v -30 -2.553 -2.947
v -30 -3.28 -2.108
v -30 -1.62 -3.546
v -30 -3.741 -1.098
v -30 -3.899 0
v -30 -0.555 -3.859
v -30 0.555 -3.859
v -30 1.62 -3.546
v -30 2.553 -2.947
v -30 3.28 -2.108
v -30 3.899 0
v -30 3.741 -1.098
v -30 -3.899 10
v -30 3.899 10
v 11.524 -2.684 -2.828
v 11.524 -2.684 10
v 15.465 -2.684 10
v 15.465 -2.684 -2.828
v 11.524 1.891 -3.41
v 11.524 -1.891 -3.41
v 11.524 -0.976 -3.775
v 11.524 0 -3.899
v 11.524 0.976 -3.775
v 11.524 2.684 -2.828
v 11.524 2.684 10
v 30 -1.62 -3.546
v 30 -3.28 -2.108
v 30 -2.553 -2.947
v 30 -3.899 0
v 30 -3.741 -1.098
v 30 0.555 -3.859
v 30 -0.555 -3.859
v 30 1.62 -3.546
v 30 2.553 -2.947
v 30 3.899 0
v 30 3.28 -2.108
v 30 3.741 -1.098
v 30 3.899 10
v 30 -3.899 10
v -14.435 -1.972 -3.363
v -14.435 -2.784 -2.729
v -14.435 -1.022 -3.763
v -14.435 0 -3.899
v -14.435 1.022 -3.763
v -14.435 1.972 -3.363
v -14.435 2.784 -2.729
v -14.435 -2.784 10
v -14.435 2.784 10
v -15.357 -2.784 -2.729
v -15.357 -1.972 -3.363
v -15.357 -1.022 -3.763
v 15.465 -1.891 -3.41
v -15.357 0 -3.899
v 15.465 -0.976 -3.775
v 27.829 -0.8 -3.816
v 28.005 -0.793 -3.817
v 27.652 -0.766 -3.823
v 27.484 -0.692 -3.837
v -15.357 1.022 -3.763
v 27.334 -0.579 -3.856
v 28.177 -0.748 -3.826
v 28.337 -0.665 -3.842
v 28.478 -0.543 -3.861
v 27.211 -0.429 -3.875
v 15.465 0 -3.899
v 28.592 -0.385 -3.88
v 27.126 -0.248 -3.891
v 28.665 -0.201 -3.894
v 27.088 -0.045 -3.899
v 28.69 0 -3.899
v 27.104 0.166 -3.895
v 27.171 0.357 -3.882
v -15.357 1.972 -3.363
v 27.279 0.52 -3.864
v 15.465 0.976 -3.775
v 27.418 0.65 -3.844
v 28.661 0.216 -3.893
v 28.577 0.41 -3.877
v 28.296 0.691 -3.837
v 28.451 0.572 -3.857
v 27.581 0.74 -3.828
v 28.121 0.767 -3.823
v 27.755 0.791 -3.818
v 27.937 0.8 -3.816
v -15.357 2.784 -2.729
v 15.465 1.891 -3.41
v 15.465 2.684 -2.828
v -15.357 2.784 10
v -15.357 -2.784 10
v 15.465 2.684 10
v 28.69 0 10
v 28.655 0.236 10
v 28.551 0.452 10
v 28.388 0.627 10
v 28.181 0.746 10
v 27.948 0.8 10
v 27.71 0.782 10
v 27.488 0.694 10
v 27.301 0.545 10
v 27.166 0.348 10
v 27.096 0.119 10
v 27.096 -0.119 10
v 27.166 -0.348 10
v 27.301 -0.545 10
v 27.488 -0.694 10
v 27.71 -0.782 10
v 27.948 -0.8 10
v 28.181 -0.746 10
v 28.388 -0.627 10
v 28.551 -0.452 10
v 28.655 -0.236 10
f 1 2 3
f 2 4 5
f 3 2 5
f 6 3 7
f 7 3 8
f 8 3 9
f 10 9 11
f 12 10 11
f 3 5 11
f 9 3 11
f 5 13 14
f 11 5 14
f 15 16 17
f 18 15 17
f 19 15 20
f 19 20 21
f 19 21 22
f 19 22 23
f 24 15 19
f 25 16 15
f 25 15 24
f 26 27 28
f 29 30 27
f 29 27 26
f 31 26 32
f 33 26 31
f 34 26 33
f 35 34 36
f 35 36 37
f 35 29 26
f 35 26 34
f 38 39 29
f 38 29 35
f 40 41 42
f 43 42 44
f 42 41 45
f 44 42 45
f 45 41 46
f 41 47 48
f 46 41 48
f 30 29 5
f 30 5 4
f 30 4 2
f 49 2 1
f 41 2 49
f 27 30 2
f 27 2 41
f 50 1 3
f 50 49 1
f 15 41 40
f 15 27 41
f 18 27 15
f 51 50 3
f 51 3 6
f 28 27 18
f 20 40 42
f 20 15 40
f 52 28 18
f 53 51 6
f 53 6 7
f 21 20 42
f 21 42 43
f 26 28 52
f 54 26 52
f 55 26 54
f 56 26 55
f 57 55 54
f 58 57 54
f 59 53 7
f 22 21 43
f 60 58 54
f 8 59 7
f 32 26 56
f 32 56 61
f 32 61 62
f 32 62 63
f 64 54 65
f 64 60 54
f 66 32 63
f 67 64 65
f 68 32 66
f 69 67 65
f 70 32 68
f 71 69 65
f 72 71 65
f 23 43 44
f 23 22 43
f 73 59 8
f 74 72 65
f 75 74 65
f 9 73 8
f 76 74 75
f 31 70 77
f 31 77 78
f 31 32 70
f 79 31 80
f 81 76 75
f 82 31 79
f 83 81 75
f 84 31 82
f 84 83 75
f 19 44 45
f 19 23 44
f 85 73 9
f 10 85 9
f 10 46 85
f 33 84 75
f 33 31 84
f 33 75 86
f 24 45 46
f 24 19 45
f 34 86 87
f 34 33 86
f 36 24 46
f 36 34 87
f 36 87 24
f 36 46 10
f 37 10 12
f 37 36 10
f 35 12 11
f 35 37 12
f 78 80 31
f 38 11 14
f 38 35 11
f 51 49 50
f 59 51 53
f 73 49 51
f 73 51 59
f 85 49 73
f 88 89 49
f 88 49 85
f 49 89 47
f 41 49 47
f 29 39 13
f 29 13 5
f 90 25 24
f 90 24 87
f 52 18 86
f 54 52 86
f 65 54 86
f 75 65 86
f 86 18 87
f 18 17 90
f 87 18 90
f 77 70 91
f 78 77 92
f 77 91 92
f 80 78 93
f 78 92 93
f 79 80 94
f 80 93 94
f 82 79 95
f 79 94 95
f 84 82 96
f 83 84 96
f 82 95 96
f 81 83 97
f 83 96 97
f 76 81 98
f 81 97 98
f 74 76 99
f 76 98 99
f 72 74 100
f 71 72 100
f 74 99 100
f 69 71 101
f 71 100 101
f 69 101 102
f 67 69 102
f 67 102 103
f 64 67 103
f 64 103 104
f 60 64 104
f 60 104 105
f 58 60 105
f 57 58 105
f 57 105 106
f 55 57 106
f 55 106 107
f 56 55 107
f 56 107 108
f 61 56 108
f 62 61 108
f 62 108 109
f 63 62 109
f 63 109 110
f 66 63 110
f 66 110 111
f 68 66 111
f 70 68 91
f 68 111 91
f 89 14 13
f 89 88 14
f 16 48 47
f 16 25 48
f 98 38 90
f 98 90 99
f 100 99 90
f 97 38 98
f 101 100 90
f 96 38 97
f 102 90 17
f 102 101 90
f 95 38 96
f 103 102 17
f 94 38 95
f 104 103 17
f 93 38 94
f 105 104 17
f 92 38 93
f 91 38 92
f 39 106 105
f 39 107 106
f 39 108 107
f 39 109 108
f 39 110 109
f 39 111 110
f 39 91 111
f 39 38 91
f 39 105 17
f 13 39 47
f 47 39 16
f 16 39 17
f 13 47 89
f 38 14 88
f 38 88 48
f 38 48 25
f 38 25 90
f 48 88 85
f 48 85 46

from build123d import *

# Parameters (mm, degrees)
F1_DEPTH = 30
F2_W     = 0.922354
F2_H     = 5.568772
F5_DEPTH = 13.899828
F3_W     = 3.941696
F3_H     = 5.368674
F6_DEPTH = 13.899828
F4_R     = 0.801782
F7_DEPTH = 13.899828


with BuildPart() as f1:
    # F0 (on Right) → F1 (new body, symmetric)
    with BuildSketch(Plane.YZ):
        with BuildLine():
            Line((3.898828, 10), (0, 10))
            Line((0, 10), (-3.898828, 10))
            Line((-3.898828, 10), (-3.898828, 0))
            ThreePointArc((-3.898828, 0), (0, -3.898828), (3.898828, 0))
            Line((3.898828, 0), (3.898828, 10))
        make_face()
    extrude(amount=F1_DEPTH, both=True)

    # F2 (on face) → F5 (cut, through all)
    with BuildSketch(Plane.XY.offset(10)):
        with Locations((-14.896151, 0)):
            Rectangle(F2_W, F2_H)
    extrude(amount=-F5_DEPTH, mode=Mode.SUBTRACT)

    # F3 (on face) → F6 (cut, through all)
    with BuildSketch(Plane.XY.offset(10)):
        with Locations((13.494484, 0)):
            Rectangle(F3_W, F3_H)
    extrude(amount=-F6_DEPTH, mode=Mode.SUBTRACT)

    # F4 (on face) → F7 (cut, through all)
    with BuildSketch(Plane.XY.offset(10)):
        with Locations((27.888514, 0)):
            Circle(F4_R)
    extrude(amount=-F7_DEPTH, mode=Mode.SUBTRACT)


solid = f1.part
